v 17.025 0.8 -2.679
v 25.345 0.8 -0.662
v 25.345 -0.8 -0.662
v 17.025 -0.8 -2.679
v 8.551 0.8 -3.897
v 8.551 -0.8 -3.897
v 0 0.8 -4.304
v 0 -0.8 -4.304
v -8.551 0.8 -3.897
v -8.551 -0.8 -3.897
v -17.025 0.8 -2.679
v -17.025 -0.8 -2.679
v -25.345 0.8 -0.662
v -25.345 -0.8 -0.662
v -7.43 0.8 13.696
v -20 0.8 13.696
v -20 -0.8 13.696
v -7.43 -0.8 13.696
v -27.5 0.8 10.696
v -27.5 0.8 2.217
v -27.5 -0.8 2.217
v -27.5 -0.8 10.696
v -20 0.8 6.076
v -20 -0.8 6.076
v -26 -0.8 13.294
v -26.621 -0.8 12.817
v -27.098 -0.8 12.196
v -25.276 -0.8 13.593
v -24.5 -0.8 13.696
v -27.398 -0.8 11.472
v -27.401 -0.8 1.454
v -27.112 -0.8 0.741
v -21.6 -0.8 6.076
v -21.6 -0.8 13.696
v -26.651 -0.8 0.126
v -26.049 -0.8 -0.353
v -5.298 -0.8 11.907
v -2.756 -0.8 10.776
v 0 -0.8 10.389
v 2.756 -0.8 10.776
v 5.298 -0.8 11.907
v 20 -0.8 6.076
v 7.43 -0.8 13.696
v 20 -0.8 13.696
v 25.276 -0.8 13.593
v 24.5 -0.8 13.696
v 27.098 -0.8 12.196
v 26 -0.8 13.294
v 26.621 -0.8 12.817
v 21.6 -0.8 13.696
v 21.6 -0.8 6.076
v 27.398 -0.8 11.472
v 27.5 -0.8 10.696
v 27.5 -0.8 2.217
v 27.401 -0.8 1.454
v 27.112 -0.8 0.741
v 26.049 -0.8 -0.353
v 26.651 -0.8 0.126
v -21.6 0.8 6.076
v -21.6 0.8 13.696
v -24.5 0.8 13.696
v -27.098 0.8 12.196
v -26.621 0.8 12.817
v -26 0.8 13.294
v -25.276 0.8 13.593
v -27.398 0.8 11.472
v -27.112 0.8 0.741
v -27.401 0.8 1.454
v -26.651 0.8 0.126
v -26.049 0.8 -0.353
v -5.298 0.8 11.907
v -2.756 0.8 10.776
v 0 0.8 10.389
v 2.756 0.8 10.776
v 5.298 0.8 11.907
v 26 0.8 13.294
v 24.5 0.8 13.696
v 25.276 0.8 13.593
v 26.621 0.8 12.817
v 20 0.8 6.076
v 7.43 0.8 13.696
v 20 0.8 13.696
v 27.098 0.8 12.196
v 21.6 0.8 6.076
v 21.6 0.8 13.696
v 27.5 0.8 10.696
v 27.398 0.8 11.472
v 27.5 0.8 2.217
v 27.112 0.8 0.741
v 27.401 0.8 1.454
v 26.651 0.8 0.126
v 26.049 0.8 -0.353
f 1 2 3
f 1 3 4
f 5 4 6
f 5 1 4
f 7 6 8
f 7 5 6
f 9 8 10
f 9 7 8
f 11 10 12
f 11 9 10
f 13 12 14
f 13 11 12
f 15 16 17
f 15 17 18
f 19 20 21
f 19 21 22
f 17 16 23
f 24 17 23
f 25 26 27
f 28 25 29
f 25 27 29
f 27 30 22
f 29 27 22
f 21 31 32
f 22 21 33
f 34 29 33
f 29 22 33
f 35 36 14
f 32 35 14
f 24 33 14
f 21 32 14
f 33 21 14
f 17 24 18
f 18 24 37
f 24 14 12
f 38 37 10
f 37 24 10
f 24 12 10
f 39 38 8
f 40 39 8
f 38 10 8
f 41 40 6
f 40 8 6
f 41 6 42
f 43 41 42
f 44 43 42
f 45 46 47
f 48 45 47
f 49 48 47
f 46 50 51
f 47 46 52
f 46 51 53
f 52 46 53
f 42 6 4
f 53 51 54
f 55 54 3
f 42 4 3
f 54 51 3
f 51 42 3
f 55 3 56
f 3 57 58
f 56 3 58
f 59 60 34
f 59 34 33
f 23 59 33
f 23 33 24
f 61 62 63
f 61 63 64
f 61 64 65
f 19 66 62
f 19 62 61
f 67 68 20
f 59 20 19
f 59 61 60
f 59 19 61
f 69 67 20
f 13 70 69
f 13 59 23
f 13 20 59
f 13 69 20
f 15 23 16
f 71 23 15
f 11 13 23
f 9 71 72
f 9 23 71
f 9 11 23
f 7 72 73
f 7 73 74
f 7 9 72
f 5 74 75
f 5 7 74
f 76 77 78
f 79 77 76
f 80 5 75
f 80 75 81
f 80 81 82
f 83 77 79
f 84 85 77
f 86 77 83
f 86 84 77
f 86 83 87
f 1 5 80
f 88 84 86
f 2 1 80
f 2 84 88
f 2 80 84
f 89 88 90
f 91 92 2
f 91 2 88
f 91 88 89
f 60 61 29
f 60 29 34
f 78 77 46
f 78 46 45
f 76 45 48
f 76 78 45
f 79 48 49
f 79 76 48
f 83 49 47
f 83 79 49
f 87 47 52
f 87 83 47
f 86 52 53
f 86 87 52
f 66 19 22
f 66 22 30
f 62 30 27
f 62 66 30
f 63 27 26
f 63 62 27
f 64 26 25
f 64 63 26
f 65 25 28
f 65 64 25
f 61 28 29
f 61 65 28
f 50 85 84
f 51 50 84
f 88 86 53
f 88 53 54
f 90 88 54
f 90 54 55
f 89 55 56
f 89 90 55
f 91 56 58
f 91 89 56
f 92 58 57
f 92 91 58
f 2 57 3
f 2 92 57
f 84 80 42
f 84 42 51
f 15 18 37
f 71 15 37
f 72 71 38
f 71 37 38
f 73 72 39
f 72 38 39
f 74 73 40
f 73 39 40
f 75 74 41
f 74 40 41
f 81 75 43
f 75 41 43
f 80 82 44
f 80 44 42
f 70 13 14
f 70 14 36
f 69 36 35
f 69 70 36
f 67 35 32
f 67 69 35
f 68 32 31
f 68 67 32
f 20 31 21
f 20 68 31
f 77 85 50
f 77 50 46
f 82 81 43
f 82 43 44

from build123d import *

# Parameters (mm, degrees)
P_IDAT_VYSUNUT_M1_DEPTH       = 0.8
SKICA3_OUTSIDE_W              = 68.578
SKICA3_OUTSIDE_H              = 31.578
ODEBRAT_VYSUNUT_M2_DEPTH      = 31.763317725
SKICA2_W                      = 1.6
SKICA2_H                      = 7.62
ODEBRAT_VYSUNUT_M1_DEPTH      = 31.763317725
ODEBRAT_VYSUNUT_M3_DEPTH      = 31.763317725
ODEBRAT_VYSUNUT_M3_DEPTH_BACK = 31.763317725


with BuildPart() as part:
    # Skica1 → Přidat vysunutím1 (new, symmetric)
    with BuildSketch(Plane(origin=(0, 0, 0), x_dir=(1, 0, 0), z_dir=(0, 1, 0))):
        with BuildLine():
            Line((-27.5, 0), (-27.5, -13.695682438))
            Line((-27.5, -13.695682438), (27.5, -13.695682438))
            Line((27.5, -13.695682438), (27.5, 0))
            ThreePointArc((27.5, 0), (0, 4.304317562), (-27.5, 0))
        make_face()
    extrude(amount=P_IDAT_VYSUNUT_M1_DEPTH, both=True)

    # Skica3 outside → Odebrat vysunutím2 (cut, through all)
    with BuildSketch(Plane(origin=(0, 0.8, 0), x_dir=(1, 0, 0), z_dir=(0, 1, 0))):
        with Locations((0, -4.696)):
            Rectangle(SKICA3_OUTSIDE_W, SKICA3_OUTSIDE_H)
        with BuildLine():
            Line((-27.5, -2.216643209), (-27.5, -10.695682438))
            ThreePointArc((-27.5, -10.695682438), (-26.621320344, -12.817002782), (-24.5, -13.695682438))
            Line((-24.5, -13.695682438), (24.5, -13.695682438))
            ThreePointArc((24.5, -13.695682438), (26.621320344, -12.817002782), (27.5, -10.695682438))
            Line((27.5, -10.695682438), (27.5, -2.216643209))
            ThreePointArc((27.5, -2.216643209), (26.901508151, -0.418655834), (25.344827599, 0.661944349))
            ThreePointArc((25.344827599, 0.661944349), (0, 4.304317562), (-25.344827599, 0.661944349))
            ThreePointArc((-25.344827599, 0.661944349), (-26.901508151, -0.418655834), (-27.5, -2.216643209))
        make_face(mode=Mode.SUBTRACT)
    extrude(amount=-ODEBRAT_VYSUNUT_M2_DEPTH, mode=Mode.SUBTRACT)

    # Skica2 → Odebrat vysunutím1 (cut, through all)
    with BuildSketch(Plane(origin=(0, 0.8, 0), x_dir=(1, 0, 0), z_dir=(0, 1, 0))):
        with Locations((-20.8, -9.885682438)):
            Rectangle(SKICA2_W, SKICA2_H)
        with Locations((20.8, -9.885682438)):
            Rectangle(SKICA2_W, SKICA2_H)
    extrude(amount=-ODEBRAT_VYSUNUT_M1_DEPTH, mode=Mode.SUBTRACT)

    # Skica6 → Odebrat vysunutím3 (cut, two sides: drawn at the far end of the back side and taken through both)
    with BuildSketch(Plane(origin=(0, 0.8, 0), x_dir=(1, 0, 0), z_dir=(0, 1, 0)).offset(-ODEBRAT_VYSUNUT_M3_DEPTH_BACK)):
        with BuildLine():
            Line((-66.724509211, -79.51573971), (-7.429758187, -13.695682438))
            ThreePointArc((-7.429758187, -13.695682438), (0, -10.388865035), (7.429758187, -13.695682438))
            Line((7.429758187, -13.695682438), (66.724509211, -79.51573971))
            Line((66.724509211, -79.51573971), (66.724509211, -256.69528072))
            Line((66.724509211, -256.69528072), (-66.724509211, -256.69528072))
            Line((-66.724509211, -256.69528072), (-66.724509211, -79.51573971))
        make_face()
    extrude(amount=ODEBRAT_VYSUNUT_M3_DEPTH + ODEBRAT_VYSUNUT_M3_DEPTH_BACK, mode=Mode.SUBTRACT)


solid = part.part
